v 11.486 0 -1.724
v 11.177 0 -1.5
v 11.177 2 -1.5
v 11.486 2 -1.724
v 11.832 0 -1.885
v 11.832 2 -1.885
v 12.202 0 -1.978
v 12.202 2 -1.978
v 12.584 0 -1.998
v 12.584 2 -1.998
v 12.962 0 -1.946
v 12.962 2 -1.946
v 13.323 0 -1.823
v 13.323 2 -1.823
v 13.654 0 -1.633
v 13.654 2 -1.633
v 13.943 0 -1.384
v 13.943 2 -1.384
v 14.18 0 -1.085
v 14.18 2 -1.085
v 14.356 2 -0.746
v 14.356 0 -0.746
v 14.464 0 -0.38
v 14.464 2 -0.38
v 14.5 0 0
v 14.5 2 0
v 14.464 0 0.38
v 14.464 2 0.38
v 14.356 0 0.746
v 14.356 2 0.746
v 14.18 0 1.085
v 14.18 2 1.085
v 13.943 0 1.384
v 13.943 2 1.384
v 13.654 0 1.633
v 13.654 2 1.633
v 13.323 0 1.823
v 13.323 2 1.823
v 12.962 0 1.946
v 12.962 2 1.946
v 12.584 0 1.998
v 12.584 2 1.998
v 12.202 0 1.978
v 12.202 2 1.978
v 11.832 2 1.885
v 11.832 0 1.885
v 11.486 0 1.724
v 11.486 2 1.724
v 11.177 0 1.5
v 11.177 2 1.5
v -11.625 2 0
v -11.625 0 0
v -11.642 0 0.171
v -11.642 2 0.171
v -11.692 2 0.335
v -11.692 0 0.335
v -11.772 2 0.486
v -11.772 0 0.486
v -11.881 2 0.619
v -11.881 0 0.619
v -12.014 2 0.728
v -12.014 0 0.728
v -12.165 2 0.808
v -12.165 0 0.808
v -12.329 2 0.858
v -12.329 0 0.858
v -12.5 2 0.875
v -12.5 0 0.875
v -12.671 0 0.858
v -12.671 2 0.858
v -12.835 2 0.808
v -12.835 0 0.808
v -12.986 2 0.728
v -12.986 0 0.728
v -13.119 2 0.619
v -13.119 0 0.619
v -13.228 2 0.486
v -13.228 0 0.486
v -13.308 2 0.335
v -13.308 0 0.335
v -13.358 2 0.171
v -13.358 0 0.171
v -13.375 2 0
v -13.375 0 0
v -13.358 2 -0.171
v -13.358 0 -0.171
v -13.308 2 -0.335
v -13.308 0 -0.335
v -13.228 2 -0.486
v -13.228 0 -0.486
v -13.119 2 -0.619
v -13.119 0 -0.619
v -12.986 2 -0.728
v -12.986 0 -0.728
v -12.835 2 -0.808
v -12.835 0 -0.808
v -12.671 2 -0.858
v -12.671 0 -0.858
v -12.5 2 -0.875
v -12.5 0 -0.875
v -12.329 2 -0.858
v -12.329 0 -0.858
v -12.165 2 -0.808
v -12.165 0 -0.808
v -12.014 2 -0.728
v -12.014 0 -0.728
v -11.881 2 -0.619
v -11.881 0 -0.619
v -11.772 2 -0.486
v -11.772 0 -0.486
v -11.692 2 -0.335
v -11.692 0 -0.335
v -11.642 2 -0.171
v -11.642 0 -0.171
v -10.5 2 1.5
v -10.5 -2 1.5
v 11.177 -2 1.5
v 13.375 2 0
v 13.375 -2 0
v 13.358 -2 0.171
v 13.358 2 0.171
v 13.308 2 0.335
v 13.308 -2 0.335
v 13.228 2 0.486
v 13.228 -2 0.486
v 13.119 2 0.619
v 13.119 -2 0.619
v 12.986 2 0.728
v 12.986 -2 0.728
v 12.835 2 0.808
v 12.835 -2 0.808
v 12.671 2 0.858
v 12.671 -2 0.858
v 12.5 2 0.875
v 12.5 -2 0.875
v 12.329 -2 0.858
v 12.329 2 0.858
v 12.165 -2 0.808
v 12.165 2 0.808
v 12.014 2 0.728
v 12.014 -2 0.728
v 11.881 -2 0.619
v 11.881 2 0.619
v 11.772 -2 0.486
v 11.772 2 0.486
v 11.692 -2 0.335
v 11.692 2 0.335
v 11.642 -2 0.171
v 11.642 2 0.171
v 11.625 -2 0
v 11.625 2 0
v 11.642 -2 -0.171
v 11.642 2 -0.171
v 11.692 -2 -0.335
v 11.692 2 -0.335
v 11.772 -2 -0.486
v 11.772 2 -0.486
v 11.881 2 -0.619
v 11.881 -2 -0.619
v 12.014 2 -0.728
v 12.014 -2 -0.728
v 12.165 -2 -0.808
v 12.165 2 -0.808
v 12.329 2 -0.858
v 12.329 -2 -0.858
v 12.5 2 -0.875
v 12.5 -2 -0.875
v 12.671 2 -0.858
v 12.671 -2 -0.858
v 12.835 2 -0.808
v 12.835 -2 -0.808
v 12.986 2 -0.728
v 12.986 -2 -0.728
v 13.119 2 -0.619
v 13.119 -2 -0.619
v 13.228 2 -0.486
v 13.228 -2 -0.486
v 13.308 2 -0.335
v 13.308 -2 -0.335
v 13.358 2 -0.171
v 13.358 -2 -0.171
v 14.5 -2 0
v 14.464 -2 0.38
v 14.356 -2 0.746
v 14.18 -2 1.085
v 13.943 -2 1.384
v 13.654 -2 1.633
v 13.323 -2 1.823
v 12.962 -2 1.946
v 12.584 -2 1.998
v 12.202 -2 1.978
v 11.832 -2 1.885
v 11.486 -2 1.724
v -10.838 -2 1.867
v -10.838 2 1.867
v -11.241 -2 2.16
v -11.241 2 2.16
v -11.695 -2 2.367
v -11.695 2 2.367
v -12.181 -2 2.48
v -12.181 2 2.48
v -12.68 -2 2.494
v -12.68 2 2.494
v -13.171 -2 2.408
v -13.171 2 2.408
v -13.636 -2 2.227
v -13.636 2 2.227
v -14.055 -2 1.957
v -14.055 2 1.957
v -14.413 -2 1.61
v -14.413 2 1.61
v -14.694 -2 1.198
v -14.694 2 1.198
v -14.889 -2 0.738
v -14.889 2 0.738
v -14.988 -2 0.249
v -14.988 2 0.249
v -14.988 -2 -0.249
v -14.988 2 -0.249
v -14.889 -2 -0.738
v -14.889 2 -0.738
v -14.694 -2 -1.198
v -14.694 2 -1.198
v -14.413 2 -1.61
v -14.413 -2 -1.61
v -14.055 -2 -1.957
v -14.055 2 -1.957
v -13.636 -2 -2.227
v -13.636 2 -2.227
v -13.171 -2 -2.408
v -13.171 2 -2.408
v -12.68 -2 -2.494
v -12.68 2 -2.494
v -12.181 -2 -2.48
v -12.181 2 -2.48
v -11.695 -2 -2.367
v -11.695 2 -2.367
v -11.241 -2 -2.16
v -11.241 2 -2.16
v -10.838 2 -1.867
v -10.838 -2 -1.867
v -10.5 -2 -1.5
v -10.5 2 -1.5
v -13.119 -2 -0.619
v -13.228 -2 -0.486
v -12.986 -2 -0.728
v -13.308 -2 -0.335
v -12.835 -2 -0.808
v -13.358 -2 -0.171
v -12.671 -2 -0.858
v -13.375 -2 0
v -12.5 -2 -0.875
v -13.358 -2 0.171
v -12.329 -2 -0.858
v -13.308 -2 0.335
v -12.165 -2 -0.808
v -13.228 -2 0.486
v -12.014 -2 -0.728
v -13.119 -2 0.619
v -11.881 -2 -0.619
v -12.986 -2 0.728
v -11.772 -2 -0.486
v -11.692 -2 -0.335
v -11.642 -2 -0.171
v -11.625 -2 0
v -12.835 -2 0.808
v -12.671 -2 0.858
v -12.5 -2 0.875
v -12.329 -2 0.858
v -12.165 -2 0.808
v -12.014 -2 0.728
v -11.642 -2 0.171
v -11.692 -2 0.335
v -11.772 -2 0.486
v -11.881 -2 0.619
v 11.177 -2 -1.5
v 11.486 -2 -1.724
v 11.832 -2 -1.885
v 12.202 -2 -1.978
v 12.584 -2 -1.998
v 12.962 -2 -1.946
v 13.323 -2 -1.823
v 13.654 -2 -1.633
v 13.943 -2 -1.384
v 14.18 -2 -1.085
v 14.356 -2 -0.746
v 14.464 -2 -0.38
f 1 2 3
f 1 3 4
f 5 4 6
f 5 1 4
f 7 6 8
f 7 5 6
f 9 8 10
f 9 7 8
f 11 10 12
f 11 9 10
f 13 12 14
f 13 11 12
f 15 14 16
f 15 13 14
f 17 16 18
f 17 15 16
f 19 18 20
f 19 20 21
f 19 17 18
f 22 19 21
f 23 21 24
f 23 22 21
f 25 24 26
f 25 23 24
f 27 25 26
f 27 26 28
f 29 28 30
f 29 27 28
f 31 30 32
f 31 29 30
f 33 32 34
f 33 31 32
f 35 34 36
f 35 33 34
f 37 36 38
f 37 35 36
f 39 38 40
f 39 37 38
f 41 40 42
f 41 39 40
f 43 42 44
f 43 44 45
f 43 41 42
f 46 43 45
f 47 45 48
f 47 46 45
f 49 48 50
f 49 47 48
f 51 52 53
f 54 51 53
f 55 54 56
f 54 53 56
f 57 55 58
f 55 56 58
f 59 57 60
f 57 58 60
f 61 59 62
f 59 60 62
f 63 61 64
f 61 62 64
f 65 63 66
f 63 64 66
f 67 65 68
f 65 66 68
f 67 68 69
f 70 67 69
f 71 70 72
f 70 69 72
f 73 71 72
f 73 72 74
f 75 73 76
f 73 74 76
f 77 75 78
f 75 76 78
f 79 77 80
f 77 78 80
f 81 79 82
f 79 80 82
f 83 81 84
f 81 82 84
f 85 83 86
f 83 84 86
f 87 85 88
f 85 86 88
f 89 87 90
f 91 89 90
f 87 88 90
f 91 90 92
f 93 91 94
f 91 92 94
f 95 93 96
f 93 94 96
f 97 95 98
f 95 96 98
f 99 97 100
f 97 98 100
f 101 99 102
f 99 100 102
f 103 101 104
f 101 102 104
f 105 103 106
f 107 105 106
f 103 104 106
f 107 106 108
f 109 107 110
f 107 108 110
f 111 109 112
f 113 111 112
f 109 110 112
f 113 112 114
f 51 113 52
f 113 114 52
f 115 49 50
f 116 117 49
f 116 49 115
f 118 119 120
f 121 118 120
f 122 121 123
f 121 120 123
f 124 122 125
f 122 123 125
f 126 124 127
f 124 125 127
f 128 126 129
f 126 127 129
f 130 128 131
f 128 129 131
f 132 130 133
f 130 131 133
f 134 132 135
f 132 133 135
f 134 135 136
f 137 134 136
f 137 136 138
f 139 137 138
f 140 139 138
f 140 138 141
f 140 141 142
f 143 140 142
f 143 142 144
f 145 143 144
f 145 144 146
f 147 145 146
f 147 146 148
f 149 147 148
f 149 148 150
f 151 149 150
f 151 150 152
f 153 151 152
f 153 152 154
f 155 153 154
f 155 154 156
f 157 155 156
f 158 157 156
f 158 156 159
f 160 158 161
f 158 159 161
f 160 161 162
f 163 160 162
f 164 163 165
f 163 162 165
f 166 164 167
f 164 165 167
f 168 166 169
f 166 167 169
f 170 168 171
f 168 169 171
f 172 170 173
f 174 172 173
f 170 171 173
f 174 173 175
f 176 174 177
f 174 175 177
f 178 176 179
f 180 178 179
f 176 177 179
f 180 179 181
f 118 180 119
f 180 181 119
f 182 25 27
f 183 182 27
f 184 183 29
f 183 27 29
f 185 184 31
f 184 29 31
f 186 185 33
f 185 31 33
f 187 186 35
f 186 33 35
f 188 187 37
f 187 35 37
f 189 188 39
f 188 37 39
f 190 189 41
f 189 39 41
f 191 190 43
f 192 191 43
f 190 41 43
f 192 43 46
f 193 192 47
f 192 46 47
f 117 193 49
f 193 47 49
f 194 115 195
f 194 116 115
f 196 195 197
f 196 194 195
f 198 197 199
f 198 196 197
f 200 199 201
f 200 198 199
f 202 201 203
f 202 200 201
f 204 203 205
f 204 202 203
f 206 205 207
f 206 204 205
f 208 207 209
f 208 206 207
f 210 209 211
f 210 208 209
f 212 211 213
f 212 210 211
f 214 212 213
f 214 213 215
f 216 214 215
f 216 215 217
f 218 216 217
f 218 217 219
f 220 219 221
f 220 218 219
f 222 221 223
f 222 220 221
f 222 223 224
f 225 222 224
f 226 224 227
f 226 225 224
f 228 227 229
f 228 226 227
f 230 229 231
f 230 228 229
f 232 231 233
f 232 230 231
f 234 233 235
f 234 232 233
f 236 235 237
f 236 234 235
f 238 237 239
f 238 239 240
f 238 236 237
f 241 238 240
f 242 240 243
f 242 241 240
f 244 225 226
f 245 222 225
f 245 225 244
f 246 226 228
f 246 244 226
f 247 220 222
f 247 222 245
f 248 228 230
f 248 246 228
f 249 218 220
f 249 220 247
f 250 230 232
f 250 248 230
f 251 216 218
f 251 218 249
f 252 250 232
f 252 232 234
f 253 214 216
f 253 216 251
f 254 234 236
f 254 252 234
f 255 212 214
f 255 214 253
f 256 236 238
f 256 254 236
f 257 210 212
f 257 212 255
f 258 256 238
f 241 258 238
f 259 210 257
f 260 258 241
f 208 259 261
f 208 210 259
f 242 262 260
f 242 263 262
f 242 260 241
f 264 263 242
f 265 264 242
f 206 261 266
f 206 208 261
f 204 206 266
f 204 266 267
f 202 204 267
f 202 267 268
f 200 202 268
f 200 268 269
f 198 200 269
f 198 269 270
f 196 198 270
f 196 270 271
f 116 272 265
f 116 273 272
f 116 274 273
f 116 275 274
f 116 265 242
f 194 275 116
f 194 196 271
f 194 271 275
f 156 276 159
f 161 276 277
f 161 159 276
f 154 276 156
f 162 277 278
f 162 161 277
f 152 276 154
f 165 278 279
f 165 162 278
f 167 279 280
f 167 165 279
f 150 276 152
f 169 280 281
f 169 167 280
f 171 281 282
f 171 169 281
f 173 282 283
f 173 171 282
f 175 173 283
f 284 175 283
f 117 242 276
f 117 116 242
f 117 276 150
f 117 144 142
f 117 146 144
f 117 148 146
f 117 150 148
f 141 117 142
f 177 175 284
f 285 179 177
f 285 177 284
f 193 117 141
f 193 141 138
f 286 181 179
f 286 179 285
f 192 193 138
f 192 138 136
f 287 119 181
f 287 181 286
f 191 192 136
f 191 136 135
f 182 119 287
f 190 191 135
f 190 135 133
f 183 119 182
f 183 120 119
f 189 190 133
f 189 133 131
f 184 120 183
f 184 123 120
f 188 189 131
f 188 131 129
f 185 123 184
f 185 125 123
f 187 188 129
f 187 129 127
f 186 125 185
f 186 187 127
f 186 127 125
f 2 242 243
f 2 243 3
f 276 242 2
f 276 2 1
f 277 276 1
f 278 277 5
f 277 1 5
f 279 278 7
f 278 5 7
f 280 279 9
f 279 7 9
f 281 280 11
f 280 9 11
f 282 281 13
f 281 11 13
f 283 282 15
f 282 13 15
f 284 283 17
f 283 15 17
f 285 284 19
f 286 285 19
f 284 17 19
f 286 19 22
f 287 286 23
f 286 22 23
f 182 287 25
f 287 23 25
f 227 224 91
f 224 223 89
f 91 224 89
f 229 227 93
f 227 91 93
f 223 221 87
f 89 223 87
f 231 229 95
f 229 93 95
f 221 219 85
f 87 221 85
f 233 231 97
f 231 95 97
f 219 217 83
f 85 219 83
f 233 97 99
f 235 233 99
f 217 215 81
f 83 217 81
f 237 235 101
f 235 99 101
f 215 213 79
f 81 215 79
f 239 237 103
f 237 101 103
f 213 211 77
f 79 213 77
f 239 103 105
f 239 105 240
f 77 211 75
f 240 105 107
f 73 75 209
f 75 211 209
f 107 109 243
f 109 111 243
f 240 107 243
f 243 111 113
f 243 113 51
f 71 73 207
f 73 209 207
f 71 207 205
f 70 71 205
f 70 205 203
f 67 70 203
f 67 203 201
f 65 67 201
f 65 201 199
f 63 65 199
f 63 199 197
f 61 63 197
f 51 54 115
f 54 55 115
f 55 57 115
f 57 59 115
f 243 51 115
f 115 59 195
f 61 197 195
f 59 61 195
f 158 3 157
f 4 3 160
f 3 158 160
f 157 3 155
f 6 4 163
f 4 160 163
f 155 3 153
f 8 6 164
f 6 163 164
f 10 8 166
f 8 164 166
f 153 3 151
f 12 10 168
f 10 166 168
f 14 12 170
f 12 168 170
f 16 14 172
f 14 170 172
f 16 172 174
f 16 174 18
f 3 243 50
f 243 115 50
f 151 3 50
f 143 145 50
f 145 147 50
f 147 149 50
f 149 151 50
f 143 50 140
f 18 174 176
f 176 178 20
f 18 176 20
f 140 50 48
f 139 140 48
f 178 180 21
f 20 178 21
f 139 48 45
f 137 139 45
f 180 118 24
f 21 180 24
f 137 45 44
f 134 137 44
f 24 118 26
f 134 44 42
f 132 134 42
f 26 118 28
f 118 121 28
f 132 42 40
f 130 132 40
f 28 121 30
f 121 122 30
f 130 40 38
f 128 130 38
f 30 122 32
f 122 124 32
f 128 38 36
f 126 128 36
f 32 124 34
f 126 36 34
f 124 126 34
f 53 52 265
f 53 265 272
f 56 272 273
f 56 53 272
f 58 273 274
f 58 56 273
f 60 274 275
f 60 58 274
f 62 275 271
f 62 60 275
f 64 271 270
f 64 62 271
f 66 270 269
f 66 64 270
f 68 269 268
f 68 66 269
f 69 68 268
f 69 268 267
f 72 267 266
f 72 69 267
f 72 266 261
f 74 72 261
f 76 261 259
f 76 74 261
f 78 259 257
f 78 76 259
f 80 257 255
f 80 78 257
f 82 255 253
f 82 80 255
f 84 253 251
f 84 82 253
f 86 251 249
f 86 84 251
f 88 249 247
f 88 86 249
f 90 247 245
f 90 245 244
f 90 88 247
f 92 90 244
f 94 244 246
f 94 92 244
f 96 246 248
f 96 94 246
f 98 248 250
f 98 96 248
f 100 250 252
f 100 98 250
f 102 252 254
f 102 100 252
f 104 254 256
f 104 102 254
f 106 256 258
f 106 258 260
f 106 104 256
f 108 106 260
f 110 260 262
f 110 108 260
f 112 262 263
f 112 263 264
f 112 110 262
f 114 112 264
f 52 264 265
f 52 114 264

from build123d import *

# Parameters (mm, degrees)
F0_R     = 0.875
F1_DEPTH = 2
F2_R     = 0.875
F3_DEPTH = 4.001


with BuildPart() as f1:
    # F0 (on Front) → F1 (new body, symmetric)
    with BuildSketch(Plane.XZ):
        with BuildLine():
            ThreePointArc((-10.5, 1.5), (-15, 0), (-10.5, -1.5))
            Line((-10.5, -1.5), (11.1771243445, -1.5))
            ThreePointArc((11.1771243445, -1.5), (10.5, 0), (11.1771243445, 1.5))
            Line((11.1771243445, 1.5), (-10.5, 1.5))
        make_face()
        with Locations((-12.5, 0)):
            Circle(F0_R, mode=Mode.SUBTRACT)
        with BuildLine():
            Line((11.1771243445, 1.5), (11.1771243445, -1.5))
            ThreePointArc((11.1771243445, -1.5), (13.3228756555, -1.8228756555), (14.5, 0))
            ThreePointArc((14.5, 0), (13.3228756555, 1.8228756555), (11.1771243445, 1.5))
        make_face()
        with BuildLine():
            ThreePointArc((11.1771243445, 1.5), (10.5, 0), (11.1771243445, -1.5))
            Line((11.1771243445, -1.5), (11.1771243445, 1.5))
        make_face()
    extrude(amount=F1_DEPTH, both=True)

    # F2 (on face) → F3 (cut, through all)
    with BuildSketch(Plane.XZ.offset(2)):
        with Locations((12.5, 0)):
            Circle(F2_R)
    extrude(amount=-F3_DEPTH, mode=Mode.SUBTRACT)


solid = f1.part
